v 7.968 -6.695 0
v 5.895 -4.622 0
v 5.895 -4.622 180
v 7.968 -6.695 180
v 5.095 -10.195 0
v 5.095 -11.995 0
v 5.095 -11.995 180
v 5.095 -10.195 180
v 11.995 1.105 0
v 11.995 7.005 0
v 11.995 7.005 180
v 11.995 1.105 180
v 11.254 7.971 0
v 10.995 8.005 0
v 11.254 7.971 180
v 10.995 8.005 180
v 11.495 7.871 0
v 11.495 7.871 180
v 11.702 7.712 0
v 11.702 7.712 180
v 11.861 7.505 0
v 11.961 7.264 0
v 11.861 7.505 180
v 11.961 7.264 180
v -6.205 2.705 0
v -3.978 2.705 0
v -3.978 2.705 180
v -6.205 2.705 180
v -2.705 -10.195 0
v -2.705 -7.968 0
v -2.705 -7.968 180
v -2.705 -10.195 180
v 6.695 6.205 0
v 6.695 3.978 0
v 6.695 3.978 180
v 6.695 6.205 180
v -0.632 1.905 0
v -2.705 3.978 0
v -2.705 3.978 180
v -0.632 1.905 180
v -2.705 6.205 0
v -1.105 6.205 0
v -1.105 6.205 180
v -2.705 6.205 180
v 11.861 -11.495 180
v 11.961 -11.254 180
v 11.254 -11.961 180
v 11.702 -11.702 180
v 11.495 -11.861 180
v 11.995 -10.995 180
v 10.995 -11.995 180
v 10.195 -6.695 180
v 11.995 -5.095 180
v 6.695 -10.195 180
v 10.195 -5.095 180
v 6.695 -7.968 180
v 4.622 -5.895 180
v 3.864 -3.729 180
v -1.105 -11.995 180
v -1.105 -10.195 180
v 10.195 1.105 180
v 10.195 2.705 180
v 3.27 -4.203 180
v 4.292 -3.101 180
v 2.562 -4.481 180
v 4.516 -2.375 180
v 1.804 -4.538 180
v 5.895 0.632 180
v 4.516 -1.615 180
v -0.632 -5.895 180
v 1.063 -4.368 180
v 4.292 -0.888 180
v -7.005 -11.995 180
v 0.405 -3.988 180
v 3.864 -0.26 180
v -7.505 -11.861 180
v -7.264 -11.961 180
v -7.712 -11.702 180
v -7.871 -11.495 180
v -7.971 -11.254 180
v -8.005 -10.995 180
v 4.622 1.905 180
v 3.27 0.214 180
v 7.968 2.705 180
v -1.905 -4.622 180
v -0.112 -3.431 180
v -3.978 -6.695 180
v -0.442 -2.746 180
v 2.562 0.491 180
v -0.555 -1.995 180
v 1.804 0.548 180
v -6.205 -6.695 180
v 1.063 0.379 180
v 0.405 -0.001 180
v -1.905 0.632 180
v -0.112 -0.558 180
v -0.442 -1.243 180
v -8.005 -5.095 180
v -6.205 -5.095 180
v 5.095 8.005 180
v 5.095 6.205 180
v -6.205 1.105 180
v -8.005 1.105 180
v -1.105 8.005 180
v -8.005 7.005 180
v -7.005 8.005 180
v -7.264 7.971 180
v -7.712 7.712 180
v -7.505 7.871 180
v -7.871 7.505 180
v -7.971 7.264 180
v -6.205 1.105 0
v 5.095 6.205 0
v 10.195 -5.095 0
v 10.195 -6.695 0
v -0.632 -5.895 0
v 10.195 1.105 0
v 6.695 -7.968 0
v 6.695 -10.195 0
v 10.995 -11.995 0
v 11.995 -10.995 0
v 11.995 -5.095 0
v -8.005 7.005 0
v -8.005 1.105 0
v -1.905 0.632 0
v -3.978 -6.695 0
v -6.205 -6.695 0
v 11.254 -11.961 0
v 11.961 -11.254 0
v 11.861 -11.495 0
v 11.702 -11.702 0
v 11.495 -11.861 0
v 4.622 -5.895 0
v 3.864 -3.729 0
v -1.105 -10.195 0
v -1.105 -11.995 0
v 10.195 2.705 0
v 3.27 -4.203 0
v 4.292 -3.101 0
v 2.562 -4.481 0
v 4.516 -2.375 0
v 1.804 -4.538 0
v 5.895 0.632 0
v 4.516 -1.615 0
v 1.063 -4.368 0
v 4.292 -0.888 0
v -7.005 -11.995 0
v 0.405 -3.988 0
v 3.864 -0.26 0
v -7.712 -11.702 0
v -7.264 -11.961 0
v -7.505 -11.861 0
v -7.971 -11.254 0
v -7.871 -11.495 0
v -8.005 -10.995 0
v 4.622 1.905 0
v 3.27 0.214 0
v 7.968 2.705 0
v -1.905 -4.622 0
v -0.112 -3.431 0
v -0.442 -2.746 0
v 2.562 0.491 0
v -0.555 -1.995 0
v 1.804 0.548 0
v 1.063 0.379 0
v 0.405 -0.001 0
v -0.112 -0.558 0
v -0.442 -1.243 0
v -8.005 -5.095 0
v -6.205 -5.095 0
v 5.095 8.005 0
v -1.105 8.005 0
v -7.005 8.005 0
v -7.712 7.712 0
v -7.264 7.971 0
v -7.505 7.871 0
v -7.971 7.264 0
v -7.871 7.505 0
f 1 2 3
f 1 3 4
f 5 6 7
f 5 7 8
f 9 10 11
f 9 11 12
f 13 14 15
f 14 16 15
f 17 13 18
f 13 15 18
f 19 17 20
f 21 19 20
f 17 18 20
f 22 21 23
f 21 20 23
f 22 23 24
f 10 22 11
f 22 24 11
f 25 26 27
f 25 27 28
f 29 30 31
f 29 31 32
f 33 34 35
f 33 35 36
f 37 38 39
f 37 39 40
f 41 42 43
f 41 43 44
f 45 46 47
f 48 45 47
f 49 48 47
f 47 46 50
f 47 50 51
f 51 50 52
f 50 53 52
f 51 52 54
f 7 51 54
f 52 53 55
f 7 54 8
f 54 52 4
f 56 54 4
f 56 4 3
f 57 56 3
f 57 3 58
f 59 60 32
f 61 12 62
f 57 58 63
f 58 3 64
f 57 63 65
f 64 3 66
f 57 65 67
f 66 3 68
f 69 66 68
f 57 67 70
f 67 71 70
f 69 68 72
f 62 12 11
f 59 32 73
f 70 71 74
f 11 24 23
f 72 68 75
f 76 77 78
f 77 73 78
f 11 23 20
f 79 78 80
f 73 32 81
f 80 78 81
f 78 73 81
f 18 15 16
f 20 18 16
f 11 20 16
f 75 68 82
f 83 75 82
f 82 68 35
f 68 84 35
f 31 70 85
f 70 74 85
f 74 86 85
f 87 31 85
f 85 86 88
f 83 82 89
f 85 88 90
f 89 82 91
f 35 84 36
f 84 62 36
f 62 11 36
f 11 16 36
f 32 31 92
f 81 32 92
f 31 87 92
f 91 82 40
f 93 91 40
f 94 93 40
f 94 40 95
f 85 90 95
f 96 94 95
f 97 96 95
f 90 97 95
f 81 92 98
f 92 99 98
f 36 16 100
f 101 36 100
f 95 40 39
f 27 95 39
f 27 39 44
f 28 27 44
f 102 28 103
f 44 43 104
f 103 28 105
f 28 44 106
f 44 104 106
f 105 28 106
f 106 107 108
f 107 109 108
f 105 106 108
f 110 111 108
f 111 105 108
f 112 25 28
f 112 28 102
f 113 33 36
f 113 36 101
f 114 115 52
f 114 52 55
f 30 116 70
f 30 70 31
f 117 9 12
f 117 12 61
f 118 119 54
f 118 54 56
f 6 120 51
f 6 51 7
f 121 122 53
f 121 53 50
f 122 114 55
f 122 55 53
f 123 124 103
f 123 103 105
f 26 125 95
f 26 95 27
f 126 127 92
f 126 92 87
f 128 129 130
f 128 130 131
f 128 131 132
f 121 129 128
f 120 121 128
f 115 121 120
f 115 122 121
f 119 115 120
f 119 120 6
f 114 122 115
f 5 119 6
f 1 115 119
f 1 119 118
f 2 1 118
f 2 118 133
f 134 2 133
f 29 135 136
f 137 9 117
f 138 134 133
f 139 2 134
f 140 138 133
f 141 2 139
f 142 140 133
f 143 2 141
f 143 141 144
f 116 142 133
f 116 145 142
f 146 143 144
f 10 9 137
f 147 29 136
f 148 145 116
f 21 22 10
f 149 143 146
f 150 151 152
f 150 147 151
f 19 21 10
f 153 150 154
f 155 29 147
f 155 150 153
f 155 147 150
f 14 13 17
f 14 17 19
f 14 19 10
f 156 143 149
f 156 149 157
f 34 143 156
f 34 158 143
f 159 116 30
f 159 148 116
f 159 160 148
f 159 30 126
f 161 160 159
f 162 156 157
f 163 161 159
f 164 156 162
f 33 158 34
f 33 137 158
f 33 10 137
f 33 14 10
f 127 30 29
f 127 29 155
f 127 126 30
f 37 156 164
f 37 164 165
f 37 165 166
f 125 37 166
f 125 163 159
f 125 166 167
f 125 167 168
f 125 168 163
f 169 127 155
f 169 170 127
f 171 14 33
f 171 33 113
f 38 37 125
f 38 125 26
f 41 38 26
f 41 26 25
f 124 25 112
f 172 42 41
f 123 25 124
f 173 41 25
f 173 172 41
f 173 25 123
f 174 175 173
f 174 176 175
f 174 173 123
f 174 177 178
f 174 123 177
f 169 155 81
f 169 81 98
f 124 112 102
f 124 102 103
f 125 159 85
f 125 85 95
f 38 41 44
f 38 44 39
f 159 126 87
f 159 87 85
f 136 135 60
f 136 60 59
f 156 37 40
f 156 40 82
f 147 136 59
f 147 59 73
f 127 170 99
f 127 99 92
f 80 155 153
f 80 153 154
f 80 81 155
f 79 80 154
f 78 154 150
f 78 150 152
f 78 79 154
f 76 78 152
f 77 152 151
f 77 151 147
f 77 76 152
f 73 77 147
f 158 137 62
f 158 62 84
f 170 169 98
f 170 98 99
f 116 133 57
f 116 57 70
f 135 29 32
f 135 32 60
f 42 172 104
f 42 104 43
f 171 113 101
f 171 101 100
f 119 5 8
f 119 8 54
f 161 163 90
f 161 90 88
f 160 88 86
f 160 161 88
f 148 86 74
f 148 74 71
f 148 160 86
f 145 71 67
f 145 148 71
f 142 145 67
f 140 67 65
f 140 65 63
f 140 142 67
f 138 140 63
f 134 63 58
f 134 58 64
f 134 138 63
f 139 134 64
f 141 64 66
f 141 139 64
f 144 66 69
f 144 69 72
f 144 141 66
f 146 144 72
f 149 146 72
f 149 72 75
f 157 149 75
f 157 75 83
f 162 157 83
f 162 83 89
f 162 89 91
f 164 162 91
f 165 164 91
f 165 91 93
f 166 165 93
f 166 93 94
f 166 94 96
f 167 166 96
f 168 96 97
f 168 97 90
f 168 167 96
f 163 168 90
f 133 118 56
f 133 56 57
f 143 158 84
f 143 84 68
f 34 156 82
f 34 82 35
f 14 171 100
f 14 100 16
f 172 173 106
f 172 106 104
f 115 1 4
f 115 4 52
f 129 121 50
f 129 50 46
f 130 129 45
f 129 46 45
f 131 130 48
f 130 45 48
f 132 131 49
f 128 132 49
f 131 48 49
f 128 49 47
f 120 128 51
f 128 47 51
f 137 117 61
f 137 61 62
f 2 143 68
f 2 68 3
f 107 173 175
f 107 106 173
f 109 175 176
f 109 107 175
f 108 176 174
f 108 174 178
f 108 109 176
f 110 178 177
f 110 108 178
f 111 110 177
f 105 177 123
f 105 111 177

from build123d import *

# Parameters (mm, degrees)
SKETCH_1_R      = 2.55
EXTRUDE_1_DEPTH = 180
FILLET_1_R      = 1


with BuildPart() as part:
    # 草图1 → 凸台-拉伸1 (new body)
    with BuildSketch(Plane.XY):
        Polygon((4.62194142, 1.905266374), (6.694733626, 3.97805858), (6.694733626, 6.205266374), (5.094733626, 6.205266374), (5.094733626, 8.005266374), (11.994733626, 8.005266374), (11.994733626, 1.105266374), (10.194733626, 1.105266374), (10.194733626, 2.705266374), (7.967525833, 2.705266374), (5.894733626, 0.632474167), (5.894733626, -4.62194142), (7.967525833, -6.694733626), (10.194733626, -6.694733626), (10.194733626, -5.094733626), (11.994733626, -5.094733626), (11.994733626, -11.994733626), (5.094733626, -11.994733626), (5.094733626, -10.194733626), (6.694733626, -10.194733626), (6.694733626, -7.967525833), (4.62194142, -5.894733626), (-0.632474167, -5.894733626), (-2.705266374, -7.967525833), (-2.705266374, -10.194733626), (-1.105266374, -10.194733626), (-1.105266374, -11.994733626), (-8.005266374, -11.994733626), (-8.005266374, -5.094733626), (-6.205266374, -5.094733626), (-6.205266374, -6.694733626), (-3.97805858, -6.694733626), (-1.905266374, -4.62194142), (-1.905266374, 0.632474167), (-3.97805858, 2.705266374), (-6.205266374, 2.705266374), (-6.205266374, 1.105266374), (-8.005266374, 1.105266374), (-8.005266374, 8.005266374), (-1.105266374, 8.005266374), (-1.105266374, 6.205266374), (-2.705266374, 6.205266374), (-2.705266374, 3.97805858), (-0.632474167, 1.905266374), align=None)
        with Locations(Location((1.994733626, -1.994733626, 0), (0, 0, 180))):
            Circle(SKETCH_1_R, mode=Mode.SUBTRACT)
    extrude(amount=EXTRUDE_1_DEPTH)

    # 圆角1
    fillet_1_edges = [part.edges().sort_by_distance(p)[0] for p in [
        (-8.005266374, -11.994733626, 90),
        (-8.005266374, 8.005266374, 90),
        (11.994733626, 8.005266374, 90),
        (11.994733626, -11.994733626, 90),
    ]]
    fillet(fillet_1_edges, radius=FILLET_1_R)


solid = part.part
